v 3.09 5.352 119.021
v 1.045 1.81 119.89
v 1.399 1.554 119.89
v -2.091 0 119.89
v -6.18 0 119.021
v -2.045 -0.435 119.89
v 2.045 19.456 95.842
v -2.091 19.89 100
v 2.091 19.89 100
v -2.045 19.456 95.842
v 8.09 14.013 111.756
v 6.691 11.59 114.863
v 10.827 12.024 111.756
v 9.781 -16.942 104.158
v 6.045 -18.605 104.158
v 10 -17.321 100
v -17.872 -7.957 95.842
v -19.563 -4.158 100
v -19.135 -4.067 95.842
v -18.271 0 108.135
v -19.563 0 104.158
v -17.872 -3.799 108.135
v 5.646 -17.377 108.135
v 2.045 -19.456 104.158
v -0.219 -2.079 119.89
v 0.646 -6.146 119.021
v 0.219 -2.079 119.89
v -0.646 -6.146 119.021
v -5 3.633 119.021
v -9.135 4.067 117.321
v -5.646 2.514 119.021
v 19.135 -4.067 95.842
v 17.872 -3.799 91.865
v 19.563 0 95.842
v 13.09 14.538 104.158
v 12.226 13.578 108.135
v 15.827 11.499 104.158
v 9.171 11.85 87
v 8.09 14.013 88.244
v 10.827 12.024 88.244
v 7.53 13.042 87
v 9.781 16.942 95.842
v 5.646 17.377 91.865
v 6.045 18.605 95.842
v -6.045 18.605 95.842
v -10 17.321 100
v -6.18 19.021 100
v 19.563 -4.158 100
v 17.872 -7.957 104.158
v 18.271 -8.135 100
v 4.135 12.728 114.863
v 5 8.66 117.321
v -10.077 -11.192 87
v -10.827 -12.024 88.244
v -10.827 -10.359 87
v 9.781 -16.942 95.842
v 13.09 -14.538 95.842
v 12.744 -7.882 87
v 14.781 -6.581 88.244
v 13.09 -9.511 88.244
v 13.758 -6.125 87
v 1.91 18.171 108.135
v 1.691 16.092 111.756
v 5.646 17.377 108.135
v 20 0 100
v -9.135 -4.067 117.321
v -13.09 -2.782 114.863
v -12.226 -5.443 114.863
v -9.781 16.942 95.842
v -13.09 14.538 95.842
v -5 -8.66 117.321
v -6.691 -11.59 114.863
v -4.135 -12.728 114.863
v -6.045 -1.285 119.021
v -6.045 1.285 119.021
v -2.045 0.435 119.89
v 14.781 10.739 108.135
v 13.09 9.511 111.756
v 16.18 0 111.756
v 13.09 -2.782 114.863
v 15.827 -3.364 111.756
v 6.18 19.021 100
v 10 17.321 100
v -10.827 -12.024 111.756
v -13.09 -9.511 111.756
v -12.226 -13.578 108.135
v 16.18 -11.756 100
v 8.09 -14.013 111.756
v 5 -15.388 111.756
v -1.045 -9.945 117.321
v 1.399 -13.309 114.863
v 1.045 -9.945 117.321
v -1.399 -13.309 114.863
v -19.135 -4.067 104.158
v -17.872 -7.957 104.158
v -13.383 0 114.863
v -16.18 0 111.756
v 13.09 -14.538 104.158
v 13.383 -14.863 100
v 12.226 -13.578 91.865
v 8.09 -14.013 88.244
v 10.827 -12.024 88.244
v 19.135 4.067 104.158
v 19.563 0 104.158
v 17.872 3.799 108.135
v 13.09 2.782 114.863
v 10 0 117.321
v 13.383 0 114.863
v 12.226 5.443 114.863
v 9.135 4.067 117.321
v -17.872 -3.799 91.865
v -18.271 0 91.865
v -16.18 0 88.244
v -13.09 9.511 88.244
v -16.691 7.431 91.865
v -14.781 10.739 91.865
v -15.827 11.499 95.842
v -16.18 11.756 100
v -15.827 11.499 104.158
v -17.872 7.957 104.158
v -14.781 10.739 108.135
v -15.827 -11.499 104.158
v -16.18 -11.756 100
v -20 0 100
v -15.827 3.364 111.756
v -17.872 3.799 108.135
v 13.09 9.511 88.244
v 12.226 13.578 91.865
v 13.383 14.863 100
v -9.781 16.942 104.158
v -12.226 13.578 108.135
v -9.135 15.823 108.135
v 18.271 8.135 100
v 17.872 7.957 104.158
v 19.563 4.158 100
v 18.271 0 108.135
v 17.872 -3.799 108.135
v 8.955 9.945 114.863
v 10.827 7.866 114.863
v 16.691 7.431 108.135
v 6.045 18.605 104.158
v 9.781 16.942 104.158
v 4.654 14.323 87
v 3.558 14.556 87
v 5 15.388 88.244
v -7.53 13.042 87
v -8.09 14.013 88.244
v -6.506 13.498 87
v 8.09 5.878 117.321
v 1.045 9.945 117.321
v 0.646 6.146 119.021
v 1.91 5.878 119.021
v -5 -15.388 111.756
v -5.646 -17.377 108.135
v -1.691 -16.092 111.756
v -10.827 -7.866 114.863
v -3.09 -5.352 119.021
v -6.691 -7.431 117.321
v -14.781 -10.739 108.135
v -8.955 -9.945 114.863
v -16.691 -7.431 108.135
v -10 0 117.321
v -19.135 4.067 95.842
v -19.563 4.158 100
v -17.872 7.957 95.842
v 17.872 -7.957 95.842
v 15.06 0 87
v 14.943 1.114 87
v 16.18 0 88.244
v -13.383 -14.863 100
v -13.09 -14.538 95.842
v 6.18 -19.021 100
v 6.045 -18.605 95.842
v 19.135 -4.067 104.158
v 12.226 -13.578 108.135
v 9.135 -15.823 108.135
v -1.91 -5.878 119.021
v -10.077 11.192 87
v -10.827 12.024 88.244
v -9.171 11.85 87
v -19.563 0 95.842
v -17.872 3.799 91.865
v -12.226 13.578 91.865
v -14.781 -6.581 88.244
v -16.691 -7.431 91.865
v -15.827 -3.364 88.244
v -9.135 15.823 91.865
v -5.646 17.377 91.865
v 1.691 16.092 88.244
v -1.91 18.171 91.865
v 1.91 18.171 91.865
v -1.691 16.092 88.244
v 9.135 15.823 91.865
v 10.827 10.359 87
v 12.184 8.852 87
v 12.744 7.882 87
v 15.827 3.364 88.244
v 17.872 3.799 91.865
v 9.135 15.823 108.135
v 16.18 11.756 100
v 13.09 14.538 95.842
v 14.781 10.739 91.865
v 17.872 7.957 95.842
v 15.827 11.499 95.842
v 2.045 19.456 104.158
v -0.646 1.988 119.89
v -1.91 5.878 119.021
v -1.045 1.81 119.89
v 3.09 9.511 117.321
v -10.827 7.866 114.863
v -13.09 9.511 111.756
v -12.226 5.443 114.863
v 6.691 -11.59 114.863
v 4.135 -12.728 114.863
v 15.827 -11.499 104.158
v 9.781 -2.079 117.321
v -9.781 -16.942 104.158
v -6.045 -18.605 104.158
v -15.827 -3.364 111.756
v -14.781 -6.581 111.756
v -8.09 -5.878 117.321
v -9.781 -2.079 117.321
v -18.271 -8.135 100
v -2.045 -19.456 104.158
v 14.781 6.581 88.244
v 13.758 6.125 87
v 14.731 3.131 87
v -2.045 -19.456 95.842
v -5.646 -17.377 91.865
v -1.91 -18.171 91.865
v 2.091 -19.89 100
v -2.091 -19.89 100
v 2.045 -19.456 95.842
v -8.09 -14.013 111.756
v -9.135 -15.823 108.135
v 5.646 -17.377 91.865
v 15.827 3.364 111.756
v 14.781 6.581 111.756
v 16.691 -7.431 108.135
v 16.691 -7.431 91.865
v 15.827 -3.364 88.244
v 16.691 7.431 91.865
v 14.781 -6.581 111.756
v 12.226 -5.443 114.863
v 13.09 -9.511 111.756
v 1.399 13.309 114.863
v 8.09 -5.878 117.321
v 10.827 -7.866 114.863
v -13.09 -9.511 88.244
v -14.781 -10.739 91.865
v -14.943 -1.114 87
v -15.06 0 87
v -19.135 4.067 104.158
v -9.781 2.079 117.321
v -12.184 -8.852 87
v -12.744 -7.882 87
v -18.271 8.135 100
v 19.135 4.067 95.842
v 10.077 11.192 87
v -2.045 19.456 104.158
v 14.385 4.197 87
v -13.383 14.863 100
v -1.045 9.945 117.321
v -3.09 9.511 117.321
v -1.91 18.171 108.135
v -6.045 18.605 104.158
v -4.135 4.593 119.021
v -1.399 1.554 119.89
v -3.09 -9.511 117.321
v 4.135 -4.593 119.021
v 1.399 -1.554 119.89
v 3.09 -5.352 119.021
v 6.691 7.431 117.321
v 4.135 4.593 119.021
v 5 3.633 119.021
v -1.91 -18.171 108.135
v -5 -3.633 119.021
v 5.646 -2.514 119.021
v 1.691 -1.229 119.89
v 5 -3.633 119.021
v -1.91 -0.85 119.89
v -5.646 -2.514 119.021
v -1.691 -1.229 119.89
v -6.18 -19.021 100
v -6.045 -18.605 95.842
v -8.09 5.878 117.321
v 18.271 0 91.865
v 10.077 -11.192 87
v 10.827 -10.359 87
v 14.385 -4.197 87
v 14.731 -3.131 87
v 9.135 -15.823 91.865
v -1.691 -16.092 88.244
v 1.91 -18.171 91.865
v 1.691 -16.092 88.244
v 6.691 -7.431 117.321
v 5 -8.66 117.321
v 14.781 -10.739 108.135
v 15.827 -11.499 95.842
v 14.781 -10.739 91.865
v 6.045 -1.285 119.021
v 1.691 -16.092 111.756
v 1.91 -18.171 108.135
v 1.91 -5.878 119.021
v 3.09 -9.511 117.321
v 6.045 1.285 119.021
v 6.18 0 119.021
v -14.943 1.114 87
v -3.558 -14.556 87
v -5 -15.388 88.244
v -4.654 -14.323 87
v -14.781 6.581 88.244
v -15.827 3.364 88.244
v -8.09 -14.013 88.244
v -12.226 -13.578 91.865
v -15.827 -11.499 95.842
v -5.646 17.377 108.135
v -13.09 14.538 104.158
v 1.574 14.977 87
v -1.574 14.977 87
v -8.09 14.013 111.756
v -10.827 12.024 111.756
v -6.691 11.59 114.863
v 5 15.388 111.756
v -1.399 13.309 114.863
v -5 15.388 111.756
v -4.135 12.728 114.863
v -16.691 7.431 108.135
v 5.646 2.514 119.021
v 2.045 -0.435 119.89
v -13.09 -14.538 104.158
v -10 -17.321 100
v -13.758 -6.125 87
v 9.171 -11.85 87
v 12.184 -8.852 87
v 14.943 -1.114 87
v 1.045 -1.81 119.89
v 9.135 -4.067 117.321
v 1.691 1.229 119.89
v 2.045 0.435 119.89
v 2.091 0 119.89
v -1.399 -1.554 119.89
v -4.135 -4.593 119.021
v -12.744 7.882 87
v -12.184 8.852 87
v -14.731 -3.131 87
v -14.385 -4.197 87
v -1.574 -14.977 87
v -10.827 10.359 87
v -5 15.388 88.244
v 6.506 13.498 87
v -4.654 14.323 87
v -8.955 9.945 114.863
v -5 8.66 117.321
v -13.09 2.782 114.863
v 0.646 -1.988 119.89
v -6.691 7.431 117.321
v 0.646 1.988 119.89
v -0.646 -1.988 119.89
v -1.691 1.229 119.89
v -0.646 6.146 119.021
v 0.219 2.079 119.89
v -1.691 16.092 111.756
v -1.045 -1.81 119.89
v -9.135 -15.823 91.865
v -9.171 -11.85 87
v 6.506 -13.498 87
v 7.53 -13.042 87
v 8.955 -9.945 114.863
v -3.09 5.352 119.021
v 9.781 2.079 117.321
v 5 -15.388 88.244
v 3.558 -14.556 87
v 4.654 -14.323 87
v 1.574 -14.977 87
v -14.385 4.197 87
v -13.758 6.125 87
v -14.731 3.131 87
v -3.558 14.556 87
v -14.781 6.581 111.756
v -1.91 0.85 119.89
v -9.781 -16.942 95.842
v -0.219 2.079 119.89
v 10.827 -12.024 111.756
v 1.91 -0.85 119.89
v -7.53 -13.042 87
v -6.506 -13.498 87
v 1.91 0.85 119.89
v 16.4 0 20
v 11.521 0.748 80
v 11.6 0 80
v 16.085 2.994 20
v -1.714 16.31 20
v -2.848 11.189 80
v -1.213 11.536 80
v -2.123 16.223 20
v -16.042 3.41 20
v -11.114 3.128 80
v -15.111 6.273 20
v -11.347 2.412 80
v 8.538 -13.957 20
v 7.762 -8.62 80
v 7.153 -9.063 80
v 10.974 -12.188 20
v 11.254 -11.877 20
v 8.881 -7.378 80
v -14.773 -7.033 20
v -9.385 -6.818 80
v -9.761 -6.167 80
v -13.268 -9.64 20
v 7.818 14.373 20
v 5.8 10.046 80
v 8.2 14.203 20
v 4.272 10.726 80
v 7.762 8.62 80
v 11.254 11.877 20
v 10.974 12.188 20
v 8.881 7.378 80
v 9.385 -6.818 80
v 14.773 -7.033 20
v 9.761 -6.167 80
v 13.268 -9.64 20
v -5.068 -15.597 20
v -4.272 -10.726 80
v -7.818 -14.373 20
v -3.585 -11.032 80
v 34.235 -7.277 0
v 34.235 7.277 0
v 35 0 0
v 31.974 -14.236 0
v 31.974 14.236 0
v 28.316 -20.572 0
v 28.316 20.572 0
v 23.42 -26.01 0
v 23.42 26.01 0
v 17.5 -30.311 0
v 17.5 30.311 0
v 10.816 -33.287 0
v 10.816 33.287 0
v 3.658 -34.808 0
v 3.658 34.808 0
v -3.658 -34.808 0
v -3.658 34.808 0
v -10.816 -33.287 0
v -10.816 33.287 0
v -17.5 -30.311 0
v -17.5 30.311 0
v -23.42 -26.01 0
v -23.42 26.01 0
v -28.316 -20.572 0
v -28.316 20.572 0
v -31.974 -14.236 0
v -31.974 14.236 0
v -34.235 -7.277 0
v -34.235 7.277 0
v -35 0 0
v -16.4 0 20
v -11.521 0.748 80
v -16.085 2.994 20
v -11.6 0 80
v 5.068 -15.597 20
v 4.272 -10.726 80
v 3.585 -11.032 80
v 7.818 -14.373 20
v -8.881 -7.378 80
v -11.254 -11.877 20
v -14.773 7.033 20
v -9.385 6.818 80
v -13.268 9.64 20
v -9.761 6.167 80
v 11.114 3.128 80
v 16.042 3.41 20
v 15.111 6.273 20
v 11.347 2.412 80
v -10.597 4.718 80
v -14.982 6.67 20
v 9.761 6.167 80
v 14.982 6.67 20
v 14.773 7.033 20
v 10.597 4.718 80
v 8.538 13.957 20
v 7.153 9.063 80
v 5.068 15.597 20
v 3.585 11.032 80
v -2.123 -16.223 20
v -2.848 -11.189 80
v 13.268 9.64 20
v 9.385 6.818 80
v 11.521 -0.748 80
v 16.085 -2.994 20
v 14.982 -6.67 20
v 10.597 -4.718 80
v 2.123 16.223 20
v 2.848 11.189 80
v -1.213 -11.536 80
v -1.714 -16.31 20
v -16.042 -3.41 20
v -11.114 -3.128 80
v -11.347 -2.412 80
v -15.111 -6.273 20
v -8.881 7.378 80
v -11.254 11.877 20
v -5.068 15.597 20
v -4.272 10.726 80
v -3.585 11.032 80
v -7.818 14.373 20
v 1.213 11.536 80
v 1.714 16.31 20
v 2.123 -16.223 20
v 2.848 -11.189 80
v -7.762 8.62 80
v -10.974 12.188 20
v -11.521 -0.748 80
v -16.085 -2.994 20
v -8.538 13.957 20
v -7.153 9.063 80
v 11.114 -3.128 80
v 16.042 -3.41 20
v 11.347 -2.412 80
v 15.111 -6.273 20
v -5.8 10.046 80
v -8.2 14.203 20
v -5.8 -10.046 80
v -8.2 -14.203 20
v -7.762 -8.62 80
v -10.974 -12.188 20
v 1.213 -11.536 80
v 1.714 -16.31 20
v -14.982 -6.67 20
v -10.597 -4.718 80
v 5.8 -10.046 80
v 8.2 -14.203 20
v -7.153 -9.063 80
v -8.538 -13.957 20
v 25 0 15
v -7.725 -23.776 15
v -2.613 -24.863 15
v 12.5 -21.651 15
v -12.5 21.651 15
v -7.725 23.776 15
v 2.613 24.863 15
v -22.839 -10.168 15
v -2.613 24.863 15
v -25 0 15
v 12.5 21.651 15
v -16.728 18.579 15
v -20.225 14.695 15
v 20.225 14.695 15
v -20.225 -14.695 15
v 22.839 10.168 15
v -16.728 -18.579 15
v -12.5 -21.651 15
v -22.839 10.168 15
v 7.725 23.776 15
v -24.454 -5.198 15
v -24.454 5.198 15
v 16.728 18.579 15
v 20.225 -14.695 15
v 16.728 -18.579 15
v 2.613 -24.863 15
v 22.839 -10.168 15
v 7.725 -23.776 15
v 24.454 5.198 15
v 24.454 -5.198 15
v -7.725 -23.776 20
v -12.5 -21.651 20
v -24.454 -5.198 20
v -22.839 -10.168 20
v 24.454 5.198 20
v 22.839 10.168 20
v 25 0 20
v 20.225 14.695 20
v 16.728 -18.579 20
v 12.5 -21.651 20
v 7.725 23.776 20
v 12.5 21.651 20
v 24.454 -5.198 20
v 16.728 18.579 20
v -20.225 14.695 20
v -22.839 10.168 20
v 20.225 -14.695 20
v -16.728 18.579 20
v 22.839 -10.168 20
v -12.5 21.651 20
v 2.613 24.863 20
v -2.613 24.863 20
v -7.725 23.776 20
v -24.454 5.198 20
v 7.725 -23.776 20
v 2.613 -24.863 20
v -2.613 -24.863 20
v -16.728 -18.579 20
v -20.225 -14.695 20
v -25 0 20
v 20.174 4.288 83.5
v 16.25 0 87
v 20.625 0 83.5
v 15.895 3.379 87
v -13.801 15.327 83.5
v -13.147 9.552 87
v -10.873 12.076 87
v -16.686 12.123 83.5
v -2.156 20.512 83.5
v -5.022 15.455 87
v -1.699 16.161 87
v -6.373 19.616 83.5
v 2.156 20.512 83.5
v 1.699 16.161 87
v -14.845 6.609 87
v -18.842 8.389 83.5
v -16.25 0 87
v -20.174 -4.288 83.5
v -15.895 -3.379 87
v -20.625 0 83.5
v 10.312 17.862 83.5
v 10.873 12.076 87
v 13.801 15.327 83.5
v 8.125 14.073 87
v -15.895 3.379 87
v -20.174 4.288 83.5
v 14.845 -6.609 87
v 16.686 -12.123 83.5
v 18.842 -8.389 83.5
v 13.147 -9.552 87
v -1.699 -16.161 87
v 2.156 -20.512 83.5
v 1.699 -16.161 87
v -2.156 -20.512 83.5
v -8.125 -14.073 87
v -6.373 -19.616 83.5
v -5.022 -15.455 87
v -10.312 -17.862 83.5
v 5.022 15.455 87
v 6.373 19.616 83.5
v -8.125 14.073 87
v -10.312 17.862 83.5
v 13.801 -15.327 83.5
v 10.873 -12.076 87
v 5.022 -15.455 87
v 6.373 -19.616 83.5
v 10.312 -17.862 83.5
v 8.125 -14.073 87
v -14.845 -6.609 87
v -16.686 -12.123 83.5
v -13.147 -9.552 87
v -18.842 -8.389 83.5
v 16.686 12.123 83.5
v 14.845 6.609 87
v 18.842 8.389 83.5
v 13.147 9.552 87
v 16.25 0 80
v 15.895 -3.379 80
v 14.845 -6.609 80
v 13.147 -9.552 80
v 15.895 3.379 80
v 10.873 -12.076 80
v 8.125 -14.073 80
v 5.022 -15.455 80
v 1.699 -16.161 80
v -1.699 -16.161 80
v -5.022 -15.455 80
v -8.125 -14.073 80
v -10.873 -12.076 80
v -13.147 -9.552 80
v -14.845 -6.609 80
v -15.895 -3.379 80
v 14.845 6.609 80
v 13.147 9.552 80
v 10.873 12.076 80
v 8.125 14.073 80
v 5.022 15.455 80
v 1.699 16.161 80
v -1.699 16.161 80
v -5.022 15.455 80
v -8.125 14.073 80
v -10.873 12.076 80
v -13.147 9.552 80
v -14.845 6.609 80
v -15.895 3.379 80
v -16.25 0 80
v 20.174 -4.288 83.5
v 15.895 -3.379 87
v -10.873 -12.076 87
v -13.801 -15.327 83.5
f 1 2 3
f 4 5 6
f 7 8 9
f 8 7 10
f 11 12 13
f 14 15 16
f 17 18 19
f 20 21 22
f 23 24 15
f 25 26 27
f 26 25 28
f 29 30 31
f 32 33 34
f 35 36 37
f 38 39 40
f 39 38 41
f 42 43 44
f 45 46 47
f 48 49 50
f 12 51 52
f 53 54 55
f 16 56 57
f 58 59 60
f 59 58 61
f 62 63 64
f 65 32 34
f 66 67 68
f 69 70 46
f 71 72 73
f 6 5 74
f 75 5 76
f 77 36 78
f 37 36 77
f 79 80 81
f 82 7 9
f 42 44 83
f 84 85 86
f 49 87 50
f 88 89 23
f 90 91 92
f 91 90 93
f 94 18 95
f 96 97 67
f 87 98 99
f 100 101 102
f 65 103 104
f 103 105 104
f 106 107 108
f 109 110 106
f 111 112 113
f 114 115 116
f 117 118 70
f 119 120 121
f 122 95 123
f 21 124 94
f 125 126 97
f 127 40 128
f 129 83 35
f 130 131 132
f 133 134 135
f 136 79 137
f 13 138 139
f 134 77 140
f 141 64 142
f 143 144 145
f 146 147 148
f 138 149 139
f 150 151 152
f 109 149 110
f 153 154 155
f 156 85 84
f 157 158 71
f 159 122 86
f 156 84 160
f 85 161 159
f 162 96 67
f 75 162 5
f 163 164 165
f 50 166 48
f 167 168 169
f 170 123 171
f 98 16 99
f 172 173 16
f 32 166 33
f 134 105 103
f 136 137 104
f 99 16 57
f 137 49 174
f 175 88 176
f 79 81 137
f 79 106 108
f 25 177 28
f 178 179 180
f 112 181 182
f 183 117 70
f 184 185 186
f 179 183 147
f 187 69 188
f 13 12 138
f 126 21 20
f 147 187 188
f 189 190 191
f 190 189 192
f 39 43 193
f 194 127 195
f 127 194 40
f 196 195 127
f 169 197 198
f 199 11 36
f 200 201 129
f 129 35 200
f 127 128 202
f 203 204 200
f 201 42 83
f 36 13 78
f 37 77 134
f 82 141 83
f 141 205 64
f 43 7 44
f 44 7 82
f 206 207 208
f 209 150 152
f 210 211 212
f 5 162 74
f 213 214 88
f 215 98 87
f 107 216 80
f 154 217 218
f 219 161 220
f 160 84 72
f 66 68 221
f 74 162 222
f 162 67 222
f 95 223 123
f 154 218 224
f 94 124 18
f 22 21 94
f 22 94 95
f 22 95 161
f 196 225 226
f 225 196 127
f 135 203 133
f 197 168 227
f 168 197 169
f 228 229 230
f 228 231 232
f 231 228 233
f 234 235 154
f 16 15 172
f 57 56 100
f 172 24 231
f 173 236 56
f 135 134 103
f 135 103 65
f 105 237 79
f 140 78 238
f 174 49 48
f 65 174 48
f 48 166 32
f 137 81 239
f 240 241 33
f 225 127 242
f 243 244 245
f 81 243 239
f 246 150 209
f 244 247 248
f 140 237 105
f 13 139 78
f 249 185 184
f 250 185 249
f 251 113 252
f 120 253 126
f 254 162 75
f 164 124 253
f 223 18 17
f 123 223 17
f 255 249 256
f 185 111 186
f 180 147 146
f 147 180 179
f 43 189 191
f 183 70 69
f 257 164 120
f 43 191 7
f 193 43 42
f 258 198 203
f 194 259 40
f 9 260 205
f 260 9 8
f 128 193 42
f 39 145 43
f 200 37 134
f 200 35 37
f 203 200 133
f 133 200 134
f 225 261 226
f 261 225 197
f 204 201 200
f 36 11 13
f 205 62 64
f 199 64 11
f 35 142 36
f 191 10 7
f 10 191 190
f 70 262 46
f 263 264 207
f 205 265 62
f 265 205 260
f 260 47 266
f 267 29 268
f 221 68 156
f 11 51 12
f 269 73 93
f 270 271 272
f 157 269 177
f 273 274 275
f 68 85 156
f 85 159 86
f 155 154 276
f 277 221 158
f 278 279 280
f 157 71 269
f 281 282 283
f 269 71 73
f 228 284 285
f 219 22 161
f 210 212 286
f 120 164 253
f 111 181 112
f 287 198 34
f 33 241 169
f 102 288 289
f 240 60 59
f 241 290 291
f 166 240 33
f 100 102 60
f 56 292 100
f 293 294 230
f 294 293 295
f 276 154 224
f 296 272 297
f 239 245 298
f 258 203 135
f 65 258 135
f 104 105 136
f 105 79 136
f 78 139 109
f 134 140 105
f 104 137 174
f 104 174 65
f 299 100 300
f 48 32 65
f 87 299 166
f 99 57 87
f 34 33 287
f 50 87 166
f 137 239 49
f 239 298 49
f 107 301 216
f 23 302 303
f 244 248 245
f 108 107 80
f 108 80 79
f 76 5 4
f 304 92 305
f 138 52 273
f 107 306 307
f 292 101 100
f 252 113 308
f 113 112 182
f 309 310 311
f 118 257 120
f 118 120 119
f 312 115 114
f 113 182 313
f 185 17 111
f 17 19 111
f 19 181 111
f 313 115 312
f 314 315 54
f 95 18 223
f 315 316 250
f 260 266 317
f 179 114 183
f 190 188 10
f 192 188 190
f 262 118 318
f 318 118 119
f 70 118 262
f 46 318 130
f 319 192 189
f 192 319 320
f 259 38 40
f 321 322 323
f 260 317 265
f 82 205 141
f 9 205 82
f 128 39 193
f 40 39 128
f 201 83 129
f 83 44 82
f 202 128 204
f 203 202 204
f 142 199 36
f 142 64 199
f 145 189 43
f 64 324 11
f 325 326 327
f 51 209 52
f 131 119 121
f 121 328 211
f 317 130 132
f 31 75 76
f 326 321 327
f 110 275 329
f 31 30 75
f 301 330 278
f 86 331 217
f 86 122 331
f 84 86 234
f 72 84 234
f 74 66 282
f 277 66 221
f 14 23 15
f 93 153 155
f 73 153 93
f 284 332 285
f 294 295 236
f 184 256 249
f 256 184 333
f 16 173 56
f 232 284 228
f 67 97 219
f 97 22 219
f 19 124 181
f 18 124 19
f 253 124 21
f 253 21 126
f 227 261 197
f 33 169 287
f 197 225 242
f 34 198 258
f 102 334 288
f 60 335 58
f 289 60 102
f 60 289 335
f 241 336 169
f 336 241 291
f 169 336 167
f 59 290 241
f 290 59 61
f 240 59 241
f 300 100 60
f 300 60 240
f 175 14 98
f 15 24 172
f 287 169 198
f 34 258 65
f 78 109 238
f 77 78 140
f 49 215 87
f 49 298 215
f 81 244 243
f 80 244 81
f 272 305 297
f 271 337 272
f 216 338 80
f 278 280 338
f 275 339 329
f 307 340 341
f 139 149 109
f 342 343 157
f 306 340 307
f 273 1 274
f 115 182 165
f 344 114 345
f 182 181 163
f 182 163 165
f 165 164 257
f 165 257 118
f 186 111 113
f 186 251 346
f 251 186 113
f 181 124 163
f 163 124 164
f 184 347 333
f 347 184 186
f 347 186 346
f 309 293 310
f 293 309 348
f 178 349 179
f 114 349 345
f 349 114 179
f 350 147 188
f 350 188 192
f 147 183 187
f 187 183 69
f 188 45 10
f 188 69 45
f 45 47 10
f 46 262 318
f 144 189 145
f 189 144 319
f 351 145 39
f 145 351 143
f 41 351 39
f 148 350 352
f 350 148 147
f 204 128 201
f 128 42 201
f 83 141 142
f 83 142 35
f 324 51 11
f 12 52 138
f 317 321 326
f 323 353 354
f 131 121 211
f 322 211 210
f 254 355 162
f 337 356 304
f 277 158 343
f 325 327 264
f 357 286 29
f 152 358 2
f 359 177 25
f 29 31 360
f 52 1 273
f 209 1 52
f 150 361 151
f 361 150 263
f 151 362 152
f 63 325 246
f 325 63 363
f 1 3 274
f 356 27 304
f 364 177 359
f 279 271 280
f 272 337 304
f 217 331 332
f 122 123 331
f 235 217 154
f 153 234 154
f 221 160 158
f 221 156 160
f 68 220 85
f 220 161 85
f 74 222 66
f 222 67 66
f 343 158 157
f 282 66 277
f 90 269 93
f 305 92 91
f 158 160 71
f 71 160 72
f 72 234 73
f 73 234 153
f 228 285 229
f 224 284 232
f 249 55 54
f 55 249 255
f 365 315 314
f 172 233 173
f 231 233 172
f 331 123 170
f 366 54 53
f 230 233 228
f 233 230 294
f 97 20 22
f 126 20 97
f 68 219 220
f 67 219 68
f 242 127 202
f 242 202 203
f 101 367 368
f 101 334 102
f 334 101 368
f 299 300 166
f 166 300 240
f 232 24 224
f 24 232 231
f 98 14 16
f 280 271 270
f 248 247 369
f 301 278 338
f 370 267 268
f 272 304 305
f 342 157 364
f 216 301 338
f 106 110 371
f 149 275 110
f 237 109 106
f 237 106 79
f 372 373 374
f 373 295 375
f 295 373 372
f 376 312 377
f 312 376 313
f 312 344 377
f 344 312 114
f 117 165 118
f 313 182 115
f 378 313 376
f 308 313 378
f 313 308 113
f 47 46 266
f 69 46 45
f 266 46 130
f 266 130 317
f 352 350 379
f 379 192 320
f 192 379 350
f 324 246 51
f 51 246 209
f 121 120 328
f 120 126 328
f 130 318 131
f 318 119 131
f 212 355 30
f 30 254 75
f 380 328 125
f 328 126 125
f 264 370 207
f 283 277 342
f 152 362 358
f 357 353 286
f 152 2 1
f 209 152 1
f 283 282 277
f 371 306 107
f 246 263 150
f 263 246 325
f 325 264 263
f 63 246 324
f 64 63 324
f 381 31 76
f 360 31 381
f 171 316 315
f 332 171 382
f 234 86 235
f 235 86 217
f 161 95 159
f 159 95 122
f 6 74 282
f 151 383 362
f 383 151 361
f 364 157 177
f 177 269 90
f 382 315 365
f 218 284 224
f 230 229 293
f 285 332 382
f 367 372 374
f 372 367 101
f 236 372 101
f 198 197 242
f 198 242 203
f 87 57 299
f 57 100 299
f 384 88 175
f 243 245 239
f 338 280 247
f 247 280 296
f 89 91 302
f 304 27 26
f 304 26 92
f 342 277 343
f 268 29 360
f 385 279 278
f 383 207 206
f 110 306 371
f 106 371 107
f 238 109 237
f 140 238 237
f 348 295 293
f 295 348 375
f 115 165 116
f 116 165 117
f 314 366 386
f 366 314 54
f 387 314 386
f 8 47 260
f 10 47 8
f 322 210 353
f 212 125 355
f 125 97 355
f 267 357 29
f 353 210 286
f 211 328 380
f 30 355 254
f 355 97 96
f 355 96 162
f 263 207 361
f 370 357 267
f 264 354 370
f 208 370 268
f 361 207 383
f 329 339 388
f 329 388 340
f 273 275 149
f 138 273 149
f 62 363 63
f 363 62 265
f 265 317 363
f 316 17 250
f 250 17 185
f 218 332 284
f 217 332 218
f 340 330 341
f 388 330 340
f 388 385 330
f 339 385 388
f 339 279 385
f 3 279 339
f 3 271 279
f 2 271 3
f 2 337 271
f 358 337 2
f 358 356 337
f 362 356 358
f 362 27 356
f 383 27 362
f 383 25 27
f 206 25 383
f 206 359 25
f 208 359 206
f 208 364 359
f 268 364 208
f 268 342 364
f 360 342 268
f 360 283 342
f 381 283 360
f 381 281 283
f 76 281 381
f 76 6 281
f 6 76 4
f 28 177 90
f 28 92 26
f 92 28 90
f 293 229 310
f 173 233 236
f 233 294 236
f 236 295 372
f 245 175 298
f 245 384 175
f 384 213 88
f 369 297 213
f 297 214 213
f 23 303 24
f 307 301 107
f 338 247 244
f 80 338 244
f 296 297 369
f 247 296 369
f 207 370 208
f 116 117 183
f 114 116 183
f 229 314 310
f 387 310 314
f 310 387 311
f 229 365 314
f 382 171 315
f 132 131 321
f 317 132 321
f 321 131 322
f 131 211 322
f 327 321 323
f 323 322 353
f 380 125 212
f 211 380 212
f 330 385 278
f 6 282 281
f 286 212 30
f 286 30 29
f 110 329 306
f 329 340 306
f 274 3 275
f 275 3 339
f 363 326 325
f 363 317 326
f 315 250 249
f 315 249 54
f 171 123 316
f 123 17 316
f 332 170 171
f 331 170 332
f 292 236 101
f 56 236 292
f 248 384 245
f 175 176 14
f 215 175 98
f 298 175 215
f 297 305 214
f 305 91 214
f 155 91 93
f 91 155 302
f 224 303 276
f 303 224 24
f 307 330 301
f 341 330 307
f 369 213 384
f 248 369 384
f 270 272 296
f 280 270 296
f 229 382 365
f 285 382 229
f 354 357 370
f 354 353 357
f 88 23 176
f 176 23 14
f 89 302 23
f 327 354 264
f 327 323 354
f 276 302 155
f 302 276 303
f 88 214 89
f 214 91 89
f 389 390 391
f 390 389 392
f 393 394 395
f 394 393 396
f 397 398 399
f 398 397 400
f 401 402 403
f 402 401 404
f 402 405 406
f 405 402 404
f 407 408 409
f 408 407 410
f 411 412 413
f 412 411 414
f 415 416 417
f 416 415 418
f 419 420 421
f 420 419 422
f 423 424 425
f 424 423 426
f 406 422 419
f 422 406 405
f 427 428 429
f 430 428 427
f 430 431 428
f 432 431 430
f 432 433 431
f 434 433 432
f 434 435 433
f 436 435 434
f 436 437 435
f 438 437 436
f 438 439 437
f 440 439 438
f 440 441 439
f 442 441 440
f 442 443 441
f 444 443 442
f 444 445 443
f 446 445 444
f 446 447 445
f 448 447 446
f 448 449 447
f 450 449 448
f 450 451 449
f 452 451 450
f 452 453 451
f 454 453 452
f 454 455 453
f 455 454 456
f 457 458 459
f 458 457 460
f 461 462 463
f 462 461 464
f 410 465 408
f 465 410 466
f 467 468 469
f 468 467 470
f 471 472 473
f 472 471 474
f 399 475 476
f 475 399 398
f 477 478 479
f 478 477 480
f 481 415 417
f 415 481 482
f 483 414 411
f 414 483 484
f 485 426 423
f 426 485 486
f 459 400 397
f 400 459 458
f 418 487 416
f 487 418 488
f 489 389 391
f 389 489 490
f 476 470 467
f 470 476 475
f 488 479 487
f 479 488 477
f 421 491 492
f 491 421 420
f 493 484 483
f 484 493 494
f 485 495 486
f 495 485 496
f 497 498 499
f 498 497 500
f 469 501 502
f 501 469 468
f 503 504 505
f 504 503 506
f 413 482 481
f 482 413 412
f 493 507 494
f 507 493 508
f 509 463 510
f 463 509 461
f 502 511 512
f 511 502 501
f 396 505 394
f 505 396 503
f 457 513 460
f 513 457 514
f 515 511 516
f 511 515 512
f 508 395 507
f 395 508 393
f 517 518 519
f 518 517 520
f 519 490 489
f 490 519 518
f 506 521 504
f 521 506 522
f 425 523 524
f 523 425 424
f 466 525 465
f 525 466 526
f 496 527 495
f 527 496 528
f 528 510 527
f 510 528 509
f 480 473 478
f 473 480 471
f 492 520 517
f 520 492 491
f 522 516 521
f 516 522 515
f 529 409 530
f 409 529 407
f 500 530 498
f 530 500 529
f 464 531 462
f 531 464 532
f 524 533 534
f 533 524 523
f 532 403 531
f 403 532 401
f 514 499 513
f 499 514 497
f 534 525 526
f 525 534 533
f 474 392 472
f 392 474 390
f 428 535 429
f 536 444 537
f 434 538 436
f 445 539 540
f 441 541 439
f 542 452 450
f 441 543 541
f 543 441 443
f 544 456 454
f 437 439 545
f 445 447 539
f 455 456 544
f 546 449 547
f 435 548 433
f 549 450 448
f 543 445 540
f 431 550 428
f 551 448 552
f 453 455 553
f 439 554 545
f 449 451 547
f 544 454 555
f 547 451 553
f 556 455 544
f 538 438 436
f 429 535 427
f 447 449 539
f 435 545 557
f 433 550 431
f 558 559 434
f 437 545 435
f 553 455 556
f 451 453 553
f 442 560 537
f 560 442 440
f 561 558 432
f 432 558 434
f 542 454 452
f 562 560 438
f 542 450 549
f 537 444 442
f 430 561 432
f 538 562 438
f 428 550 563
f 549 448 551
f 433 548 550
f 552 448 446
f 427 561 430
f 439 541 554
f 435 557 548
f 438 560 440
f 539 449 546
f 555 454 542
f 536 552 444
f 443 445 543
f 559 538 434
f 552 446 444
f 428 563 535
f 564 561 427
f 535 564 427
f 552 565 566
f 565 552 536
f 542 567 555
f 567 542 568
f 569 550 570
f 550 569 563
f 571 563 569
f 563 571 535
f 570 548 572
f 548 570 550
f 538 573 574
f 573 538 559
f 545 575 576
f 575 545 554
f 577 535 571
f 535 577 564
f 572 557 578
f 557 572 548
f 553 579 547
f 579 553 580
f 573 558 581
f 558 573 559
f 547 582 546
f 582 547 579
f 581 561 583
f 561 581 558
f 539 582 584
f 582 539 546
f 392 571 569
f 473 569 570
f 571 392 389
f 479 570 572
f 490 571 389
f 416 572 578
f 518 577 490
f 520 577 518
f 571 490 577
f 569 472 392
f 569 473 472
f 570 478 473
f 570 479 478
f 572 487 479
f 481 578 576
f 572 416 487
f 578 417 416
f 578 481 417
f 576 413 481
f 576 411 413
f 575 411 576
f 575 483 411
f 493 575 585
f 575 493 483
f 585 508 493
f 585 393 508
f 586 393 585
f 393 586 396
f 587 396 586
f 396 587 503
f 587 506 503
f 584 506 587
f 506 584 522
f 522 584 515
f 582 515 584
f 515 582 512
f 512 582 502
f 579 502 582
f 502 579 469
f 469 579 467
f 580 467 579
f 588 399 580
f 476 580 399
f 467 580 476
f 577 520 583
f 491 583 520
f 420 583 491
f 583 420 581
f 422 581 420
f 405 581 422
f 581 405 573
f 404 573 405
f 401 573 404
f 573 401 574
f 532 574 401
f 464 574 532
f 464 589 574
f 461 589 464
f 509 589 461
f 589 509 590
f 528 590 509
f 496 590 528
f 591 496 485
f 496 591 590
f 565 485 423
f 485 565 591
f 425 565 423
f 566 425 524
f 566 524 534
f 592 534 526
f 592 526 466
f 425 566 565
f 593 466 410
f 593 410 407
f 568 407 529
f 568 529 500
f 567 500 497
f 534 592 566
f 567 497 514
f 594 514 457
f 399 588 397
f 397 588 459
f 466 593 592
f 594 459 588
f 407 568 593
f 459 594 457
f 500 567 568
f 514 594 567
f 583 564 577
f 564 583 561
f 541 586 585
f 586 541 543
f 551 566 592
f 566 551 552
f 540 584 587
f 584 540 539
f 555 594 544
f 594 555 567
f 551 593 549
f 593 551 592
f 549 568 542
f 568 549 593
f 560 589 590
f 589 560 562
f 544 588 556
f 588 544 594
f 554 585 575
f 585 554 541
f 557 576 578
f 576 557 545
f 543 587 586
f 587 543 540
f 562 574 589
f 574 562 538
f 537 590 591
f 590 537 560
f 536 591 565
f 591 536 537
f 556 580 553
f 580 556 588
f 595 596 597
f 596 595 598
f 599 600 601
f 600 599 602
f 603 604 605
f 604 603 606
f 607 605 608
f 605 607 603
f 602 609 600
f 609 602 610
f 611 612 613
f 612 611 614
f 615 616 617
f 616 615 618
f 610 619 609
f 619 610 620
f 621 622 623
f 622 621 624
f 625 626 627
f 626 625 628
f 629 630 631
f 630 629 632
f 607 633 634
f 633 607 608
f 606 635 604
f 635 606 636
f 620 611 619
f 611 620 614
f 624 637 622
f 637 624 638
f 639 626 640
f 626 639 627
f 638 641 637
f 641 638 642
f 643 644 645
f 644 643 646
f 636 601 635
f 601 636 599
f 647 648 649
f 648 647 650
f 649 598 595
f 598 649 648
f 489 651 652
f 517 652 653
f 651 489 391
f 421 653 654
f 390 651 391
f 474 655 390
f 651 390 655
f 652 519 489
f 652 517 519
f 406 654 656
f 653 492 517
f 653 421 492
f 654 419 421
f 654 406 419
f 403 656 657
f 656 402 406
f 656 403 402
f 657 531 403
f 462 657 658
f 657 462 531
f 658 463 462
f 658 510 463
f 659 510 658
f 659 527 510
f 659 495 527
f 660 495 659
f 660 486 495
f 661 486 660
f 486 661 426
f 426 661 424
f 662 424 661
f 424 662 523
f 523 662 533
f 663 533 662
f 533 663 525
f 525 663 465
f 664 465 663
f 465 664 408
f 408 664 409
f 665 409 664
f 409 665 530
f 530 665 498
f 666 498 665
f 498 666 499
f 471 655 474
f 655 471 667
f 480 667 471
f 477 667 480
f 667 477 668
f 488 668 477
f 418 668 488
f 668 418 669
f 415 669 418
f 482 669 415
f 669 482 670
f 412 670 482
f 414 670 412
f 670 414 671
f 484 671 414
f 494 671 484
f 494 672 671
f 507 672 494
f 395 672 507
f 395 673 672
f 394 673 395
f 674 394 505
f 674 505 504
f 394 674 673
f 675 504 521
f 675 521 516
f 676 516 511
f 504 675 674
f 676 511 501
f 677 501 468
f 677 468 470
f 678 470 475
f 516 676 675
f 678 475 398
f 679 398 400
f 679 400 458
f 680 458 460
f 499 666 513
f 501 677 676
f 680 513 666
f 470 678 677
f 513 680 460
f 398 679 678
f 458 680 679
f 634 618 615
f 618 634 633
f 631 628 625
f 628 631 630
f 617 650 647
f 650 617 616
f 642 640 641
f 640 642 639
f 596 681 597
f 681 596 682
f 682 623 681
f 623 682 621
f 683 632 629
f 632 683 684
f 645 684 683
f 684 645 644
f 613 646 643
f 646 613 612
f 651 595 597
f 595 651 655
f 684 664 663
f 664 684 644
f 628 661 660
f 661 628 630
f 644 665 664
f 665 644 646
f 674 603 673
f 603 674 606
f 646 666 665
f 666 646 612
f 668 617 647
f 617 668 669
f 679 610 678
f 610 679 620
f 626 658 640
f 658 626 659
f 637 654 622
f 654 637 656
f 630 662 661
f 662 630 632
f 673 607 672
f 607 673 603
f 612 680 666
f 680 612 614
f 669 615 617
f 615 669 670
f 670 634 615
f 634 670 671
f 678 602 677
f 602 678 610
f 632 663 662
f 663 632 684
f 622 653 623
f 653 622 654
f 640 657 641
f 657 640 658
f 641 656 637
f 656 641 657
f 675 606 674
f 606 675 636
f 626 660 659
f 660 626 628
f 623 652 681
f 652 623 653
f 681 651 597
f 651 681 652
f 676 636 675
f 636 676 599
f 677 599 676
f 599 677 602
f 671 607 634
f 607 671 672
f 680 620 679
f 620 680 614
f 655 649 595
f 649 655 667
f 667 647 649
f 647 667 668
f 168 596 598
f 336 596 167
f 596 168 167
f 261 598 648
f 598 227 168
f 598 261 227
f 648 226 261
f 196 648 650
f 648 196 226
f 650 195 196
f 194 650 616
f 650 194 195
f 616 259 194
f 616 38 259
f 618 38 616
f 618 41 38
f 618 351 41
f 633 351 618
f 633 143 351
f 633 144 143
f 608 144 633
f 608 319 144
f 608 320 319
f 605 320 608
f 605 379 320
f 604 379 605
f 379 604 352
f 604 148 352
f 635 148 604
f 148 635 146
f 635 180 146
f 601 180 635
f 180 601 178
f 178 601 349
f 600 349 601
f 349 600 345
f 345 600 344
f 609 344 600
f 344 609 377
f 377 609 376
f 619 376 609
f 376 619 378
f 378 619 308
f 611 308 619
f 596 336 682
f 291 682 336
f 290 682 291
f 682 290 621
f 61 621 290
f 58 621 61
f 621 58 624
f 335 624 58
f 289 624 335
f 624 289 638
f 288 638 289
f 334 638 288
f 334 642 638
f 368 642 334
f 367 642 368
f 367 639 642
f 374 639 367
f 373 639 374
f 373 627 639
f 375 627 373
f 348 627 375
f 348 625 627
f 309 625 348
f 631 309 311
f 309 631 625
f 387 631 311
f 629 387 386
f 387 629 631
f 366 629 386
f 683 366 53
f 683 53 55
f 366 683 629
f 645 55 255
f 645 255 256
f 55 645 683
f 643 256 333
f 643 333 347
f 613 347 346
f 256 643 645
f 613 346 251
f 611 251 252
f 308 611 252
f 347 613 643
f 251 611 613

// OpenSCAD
union(){
    //pawm
union(){
translate([0,0,100])
sphere(r=20);
cylinder(h=100,r1=18,r2=10);
cylinder(h=15,r1=35,r2=25);
    translate([0,0,15])
    cylinder(h=5,r1=25,r2=25);
}
 translate([0,0,80])
intersection(){
cylinder(h=20,r1=25,r2=0);
translate([0,0,7])
mirror([0,0,1])
cylinder(h=20,r1=25,r2=0);}}
